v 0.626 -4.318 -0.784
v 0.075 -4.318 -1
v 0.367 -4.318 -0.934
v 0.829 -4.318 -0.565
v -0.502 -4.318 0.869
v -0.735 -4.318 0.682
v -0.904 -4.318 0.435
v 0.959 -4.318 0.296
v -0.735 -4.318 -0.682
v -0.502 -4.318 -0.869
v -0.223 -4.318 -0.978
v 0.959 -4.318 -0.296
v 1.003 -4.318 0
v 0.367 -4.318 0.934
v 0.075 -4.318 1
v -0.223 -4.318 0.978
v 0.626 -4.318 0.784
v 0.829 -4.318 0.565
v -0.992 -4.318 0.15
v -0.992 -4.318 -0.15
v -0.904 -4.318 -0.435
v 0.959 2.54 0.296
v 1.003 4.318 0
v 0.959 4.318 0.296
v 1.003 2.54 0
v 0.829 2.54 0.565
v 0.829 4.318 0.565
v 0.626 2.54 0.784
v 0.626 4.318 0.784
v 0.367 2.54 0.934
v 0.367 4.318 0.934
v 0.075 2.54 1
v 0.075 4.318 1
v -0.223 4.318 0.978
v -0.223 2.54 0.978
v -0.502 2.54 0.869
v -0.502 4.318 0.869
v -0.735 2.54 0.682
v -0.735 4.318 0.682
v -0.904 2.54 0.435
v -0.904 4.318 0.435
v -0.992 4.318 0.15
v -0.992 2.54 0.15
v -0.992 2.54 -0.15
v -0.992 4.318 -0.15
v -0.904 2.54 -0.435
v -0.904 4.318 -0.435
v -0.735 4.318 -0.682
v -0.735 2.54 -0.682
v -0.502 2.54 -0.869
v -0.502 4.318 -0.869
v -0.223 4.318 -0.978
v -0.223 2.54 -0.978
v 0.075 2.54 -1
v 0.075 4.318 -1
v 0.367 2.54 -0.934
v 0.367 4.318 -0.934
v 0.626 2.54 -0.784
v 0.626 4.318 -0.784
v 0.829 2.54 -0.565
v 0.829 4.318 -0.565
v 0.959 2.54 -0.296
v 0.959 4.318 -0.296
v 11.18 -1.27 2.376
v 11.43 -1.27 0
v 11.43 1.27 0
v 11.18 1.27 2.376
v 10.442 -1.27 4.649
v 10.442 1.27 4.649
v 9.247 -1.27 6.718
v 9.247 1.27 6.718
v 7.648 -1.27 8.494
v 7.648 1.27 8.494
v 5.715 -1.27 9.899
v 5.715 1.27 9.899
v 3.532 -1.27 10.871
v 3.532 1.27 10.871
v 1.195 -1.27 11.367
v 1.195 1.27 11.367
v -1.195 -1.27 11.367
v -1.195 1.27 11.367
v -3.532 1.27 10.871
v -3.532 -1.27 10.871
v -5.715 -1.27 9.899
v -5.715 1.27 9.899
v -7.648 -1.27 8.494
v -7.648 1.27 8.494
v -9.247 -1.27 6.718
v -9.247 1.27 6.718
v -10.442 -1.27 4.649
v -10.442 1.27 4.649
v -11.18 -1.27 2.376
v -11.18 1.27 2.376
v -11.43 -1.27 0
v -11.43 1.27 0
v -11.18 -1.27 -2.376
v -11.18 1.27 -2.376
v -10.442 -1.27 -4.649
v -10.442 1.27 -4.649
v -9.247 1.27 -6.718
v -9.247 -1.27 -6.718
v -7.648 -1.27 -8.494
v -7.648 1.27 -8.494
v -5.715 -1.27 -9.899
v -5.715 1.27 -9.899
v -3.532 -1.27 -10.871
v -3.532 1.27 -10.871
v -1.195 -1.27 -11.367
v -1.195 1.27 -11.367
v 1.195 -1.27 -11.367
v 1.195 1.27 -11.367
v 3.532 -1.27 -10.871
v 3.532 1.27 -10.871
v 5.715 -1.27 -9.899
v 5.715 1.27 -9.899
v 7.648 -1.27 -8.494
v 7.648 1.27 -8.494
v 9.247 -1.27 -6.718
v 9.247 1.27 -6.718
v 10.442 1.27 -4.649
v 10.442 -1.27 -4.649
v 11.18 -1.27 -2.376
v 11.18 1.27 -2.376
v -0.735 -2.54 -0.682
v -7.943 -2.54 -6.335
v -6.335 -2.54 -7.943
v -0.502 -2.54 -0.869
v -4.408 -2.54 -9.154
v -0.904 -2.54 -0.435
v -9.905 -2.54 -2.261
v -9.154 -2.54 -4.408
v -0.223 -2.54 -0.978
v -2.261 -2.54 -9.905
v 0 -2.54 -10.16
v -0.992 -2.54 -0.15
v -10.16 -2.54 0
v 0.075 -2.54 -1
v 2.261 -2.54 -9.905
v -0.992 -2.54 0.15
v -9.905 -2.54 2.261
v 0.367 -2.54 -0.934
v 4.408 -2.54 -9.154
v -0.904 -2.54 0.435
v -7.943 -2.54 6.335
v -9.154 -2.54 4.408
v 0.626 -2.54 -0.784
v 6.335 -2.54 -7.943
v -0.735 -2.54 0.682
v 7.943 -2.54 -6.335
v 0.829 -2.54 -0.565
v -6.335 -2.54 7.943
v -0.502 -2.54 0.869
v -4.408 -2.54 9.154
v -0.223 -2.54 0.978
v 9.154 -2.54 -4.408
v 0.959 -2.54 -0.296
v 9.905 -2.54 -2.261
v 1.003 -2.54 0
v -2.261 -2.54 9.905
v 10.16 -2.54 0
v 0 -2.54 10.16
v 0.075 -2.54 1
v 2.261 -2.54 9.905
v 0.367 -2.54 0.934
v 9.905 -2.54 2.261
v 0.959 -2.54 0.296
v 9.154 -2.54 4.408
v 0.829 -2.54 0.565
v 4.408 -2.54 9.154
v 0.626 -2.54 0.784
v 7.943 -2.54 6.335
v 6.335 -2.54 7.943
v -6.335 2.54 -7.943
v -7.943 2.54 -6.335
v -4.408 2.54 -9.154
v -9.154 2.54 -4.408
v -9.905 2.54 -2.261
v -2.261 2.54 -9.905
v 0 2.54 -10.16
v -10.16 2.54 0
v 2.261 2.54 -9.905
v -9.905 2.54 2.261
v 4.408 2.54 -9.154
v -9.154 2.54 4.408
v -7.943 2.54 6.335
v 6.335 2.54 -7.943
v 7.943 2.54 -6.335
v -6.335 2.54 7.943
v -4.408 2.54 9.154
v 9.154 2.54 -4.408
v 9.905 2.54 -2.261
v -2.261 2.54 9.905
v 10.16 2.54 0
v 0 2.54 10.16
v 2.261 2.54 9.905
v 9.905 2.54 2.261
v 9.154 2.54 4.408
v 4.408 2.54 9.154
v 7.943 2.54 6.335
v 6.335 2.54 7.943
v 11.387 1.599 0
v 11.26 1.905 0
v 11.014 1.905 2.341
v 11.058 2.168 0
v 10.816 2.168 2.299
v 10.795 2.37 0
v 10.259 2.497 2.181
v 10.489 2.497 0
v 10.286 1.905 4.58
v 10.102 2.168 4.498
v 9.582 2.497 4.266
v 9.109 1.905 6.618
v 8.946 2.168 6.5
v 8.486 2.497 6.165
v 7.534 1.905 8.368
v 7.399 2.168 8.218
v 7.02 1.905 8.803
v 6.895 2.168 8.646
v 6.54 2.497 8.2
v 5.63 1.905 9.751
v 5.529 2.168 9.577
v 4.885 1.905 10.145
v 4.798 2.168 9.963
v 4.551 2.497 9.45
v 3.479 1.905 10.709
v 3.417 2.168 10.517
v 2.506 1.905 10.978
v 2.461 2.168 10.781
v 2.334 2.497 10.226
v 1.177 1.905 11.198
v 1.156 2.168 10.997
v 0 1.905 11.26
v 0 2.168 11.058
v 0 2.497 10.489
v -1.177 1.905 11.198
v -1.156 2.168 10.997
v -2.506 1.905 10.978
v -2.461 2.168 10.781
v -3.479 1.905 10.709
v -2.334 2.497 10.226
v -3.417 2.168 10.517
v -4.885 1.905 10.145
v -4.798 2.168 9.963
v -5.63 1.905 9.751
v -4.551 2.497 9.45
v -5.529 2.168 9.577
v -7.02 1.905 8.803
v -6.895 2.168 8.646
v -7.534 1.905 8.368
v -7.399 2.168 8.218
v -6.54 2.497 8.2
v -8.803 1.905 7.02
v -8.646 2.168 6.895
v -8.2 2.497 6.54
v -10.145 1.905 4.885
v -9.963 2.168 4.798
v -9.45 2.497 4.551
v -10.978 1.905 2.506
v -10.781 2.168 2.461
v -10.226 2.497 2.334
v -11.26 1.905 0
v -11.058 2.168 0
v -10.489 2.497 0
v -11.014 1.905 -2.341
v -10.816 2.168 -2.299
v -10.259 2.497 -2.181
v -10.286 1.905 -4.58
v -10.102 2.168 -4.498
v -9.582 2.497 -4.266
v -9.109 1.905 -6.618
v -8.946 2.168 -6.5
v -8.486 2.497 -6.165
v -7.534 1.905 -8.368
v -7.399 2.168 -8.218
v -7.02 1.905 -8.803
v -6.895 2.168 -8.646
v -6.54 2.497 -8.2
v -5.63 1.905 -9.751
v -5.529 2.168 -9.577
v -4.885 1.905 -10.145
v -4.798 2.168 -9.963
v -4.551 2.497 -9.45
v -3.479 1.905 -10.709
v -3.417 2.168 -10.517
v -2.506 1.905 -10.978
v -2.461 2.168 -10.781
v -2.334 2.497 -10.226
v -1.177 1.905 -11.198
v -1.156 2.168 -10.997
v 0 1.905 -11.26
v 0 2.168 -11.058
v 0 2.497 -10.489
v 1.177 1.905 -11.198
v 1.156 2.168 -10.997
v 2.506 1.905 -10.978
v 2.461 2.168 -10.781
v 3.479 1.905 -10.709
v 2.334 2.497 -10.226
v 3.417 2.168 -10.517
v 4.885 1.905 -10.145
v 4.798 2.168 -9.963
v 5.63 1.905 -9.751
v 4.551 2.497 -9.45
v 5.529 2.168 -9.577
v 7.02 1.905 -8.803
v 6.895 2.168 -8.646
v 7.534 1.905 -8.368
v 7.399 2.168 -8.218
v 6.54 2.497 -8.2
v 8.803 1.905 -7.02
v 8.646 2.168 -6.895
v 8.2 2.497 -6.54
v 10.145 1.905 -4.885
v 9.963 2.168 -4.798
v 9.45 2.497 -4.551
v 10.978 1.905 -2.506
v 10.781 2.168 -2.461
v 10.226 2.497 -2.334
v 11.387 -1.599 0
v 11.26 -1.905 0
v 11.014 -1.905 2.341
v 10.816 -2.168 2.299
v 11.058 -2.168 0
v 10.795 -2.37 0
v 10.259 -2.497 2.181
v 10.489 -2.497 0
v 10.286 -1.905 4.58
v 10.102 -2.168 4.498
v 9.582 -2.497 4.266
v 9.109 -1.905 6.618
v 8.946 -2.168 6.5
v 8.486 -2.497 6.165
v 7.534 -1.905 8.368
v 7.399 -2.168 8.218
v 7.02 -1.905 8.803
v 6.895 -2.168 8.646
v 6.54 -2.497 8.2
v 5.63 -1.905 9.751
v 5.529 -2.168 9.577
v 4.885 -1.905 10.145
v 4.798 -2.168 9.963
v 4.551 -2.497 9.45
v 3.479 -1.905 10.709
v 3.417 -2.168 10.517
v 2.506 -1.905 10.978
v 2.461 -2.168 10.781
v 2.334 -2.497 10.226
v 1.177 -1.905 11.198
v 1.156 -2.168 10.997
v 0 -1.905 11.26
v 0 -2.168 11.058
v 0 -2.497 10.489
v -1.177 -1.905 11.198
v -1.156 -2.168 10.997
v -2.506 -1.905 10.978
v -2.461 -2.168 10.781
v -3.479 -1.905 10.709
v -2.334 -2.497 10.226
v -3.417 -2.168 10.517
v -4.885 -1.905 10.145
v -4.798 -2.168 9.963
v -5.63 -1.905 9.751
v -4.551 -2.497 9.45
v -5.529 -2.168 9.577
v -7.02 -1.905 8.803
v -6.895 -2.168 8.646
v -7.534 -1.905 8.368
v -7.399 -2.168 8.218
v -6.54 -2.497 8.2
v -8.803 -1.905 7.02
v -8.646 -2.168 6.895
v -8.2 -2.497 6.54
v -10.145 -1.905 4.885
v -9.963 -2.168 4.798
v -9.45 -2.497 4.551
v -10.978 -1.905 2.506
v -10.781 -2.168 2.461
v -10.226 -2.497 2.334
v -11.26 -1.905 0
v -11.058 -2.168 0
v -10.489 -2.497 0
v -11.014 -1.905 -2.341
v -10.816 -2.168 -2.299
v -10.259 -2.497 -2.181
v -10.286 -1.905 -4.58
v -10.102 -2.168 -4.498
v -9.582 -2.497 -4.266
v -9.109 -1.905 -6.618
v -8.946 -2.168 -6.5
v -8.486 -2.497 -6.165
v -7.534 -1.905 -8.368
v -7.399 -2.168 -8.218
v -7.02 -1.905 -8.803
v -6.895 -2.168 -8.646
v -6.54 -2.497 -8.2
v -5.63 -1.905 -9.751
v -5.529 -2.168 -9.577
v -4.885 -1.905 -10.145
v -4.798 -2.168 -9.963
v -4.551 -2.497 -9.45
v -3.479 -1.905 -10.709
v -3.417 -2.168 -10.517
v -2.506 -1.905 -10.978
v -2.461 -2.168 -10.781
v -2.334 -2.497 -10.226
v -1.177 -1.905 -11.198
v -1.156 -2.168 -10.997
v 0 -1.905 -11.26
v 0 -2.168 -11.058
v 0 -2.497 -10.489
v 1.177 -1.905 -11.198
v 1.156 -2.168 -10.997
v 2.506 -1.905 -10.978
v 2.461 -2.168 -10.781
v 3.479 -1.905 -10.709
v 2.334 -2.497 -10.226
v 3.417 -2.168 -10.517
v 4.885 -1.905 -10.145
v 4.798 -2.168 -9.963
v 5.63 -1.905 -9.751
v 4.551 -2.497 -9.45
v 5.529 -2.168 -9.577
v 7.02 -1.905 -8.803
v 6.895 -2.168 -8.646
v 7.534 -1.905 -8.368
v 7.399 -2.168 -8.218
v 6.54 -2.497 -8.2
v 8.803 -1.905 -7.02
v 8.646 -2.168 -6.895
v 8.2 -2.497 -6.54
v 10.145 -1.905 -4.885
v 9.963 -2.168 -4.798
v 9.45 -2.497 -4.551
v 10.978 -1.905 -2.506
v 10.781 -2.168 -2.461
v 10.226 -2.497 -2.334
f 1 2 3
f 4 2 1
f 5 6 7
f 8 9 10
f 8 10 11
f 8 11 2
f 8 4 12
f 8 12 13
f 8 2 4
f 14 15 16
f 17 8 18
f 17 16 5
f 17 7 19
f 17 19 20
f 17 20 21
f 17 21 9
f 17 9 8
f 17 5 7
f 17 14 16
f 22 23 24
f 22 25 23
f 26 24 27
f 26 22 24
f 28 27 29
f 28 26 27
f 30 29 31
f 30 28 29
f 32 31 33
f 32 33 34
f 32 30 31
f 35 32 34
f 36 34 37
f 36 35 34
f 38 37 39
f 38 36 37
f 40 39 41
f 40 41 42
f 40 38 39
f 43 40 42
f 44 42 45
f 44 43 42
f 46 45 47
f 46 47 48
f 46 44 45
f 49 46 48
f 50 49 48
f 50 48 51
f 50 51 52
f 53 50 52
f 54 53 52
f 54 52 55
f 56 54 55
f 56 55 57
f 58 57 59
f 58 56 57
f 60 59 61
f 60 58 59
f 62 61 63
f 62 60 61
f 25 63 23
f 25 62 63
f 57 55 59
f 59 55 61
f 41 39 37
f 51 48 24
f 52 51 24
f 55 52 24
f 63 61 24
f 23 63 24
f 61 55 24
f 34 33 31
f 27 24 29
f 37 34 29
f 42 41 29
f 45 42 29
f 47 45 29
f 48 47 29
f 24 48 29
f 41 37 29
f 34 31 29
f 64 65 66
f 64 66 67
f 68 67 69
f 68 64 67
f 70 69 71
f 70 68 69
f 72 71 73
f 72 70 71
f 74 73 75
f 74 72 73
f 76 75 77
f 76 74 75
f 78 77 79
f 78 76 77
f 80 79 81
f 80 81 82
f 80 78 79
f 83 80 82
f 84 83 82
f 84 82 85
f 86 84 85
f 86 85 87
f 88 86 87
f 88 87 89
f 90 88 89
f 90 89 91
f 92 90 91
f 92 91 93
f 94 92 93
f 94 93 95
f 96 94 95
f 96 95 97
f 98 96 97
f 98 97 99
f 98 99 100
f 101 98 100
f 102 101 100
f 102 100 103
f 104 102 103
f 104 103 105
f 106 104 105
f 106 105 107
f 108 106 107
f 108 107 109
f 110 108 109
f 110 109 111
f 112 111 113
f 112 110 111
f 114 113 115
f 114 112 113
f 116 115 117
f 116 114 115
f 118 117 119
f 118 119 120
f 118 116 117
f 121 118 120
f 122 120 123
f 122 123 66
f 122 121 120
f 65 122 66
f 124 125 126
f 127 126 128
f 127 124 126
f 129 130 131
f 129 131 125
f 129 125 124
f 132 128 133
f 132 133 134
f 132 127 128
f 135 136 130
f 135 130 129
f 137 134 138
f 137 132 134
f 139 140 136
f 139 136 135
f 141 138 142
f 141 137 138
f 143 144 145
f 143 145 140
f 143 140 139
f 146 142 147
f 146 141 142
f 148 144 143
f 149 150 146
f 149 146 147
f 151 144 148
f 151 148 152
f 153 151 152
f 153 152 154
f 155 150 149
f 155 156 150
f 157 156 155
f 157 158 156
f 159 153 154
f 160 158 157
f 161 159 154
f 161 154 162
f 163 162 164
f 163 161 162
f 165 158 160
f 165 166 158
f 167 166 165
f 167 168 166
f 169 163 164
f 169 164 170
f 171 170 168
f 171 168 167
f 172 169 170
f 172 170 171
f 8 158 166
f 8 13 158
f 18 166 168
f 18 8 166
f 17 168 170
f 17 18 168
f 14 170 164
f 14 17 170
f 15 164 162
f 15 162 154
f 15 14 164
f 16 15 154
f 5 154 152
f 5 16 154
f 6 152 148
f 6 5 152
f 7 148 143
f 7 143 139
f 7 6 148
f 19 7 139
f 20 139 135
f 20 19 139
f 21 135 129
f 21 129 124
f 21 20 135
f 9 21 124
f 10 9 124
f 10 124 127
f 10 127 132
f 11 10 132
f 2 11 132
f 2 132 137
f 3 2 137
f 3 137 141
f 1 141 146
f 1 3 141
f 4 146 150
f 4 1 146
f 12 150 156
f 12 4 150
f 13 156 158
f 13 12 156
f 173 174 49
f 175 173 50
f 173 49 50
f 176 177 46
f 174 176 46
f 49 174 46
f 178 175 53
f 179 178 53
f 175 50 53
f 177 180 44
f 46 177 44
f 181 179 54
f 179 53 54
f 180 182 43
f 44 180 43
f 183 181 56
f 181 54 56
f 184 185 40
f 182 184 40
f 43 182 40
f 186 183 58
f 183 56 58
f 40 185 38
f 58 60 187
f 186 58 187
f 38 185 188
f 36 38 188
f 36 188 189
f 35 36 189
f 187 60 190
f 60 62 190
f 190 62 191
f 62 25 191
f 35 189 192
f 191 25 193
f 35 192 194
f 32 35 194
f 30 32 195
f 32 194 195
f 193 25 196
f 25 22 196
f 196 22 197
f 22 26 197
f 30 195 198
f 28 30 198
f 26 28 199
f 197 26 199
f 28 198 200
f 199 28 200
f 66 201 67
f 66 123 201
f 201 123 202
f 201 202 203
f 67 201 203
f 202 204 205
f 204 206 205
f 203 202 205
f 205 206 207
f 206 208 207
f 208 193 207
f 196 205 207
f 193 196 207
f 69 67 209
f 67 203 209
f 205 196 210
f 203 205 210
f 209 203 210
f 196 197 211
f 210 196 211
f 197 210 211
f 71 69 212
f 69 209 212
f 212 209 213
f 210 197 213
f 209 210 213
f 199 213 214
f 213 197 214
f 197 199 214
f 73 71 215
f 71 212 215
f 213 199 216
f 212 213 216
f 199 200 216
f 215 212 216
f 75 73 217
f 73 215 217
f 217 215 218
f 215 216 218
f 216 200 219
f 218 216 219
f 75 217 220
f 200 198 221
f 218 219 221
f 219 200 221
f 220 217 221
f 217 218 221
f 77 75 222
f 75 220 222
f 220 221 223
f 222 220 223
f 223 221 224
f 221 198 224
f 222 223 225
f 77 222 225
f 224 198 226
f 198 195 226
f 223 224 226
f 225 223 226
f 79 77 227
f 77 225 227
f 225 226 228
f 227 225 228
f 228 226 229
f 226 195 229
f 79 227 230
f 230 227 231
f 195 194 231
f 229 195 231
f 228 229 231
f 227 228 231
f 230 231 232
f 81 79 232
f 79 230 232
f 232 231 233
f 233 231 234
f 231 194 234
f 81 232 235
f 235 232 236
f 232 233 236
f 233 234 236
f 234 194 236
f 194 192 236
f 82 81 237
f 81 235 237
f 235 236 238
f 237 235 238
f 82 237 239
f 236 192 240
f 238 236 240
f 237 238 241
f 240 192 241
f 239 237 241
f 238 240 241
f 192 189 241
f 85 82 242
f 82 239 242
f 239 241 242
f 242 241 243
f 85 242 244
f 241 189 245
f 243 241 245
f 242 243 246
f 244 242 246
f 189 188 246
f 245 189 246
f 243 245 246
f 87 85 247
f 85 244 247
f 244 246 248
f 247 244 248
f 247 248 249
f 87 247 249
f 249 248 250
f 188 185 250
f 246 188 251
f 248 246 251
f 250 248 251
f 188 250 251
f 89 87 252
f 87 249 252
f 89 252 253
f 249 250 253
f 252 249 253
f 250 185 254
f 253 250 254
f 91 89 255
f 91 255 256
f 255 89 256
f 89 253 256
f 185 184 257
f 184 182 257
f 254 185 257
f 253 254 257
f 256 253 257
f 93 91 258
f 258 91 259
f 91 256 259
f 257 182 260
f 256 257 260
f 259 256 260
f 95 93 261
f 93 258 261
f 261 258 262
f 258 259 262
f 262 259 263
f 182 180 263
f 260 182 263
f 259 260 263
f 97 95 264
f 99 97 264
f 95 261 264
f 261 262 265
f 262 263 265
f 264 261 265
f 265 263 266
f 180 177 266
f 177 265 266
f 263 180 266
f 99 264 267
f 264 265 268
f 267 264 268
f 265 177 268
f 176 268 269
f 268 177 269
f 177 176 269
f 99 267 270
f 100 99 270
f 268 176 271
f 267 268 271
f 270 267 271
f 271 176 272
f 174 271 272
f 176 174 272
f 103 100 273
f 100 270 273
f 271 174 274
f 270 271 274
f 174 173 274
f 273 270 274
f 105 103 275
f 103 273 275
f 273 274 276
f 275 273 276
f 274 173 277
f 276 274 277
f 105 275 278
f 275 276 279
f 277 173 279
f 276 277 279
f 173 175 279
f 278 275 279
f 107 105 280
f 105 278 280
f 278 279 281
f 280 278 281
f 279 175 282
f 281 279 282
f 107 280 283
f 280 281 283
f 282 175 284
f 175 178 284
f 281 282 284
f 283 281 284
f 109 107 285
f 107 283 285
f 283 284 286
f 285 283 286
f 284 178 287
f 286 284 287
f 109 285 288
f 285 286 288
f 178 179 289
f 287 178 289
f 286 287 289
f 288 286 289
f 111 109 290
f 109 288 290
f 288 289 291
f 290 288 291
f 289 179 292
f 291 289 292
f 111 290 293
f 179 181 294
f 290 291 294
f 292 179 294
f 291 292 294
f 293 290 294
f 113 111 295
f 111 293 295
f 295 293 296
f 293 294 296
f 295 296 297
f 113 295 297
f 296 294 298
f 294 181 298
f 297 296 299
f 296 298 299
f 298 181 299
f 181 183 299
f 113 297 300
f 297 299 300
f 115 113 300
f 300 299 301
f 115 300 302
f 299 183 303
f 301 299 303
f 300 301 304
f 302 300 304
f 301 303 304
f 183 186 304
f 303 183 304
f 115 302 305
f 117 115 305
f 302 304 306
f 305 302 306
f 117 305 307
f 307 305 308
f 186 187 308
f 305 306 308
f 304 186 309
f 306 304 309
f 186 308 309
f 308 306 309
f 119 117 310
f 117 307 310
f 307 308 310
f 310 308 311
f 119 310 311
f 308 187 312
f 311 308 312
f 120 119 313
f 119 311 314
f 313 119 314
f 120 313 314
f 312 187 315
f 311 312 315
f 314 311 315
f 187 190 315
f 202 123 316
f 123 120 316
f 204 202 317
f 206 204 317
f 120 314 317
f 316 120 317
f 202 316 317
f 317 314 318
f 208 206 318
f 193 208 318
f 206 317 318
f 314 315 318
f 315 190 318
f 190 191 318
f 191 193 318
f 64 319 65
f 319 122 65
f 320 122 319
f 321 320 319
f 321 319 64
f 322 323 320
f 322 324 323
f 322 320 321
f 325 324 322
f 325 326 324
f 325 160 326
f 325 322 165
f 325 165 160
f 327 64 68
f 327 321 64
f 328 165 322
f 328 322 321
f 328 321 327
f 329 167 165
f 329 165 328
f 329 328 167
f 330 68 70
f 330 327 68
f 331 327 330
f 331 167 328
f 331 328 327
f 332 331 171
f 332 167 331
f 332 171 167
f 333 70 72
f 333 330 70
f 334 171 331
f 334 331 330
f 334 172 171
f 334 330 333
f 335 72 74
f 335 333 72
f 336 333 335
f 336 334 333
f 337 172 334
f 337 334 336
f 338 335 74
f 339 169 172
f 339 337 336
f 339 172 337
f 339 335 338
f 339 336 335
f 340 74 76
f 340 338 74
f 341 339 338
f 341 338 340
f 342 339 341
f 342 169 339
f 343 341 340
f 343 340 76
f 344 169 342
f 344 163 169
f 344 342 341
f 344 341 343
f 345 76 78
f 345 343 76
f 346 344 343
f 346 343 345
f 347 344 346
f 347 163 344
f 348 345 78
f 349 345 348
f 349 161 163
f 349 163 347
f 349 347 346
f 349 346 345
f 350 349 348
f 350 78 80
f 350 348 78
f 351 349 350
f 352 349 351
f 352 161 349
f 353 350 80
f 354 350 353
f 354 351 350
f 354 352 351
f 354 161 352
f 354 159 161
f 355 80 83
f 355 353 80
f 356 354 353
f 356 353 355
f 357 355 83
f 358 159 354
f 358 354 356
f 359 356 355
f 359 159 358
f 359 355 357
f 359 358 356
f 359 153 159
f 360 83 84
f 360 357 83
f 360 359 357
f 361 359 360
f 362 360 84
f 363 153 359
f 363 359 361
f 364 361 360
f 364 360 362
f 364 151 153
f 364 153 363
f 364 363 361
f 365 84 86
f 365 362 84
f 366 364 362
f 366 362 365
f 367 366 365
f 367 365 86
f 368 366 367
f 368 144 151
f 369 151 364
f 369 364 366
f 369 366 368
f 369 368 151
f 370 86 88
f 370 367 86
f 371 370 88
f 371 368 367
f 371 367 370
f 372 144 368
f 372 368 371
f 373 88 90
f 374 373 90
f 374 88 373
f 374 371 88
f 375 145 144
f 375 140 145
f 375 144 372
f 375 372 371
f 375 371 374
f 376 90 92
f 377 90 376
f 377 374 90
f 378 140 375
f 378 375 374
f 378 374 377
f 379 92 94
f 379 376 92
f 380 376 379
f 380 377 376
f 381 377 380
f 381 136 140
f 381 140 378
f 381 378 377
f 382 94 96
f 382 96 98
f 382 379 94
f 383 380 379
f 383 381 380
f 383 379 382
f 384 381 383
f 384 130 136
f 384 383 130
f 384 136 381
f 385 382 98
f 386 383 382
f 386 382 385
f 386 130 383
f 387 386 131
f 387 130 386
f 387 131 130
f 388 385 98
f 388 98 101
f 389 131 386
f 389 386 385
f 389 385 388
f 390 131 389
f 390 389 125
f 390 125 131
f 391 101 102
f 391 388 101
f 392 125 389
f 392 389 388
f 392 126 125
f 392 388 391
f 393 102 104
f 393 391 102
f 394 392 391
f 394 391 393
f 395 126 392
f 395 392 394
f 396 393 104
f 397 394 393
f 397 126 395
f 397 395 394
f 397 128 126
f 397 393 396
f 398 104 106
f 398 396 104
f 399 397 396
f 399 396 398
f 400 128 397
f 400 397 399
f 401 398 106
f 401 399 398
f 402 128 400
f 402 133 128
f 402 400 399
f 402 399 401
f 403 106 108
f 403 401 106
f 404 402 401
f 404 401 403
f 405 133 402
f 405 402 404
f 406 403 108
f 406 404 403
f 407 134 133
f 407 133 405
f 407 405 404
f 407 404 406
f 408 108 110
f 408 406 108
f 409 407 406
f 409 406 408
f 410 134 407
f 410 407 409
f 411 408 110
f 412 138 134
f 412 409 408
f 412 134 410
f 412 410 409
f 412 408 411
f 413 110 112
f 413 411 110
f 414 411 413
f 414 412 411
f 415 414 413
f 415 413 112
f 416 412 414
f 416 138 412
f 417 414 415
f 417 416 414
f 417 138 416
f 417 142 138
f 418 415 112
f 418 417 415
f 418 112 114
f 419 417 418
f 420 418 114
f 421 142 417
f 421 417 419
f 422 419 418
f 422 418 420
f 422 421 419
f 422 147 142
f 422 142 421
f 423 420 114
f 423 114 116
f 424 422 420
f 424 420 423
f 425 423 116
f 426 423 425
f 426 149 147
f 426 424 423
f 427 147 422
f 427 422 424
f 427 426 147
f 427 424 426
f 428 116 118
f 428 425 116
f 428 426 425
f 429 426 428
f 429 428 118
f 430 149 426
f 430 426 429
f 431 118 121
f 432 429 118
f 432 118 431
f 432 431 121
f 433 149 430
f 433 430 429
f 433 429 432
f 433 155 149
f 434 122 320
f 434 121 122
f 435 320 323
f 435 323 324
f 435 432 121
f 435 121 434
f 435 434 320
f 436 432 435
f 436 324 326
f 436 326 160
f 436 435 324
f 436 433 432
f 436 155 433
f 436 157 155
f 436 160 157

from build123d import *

# Parameters (mm, degrees)
F0_R          = 1.0033
F1_DEPTH      = 4.318
F1_DEPTH_BACK = 4.318
F0_R_2        = 11.43
F2_DEPTH      = 2.54
F2_DEPTH_BACK = 2.54
F3_R          = 1.27


with BuildPart() as f1:
    # F0 (on Front) → F1 (new body, two sides)
    with BuildSketch(Plane.XZ) as f1_sk:
        Circle(F0_R)
    extrude(amount=F1_DEPTH)
    extrude(f1_sk.sketch, amount=-F1_DEPTH_BACK)

    # F0 (on Front) → F2 (join, two sides)
    with BuildSketch(Plane.XZ) as f2_sk:
        Circle(F0_R_2)
        Circle(F0_R, mode=Mode.SUBTRACT)
    extrude(amount=F2_DEPTH)
    extrude(f2_sk.sketch, amount=-F2_DEPTH_BACK)

    # F3
    f3_edges = [f1.edges().sort_by_distance(p)[0] for p in [
        (-11.43, -2.54, 0),
        (-11.43, 2.54, 0),
    ]]
    fillet(f3_edges, radius=F3_R)


solid = f1.part
